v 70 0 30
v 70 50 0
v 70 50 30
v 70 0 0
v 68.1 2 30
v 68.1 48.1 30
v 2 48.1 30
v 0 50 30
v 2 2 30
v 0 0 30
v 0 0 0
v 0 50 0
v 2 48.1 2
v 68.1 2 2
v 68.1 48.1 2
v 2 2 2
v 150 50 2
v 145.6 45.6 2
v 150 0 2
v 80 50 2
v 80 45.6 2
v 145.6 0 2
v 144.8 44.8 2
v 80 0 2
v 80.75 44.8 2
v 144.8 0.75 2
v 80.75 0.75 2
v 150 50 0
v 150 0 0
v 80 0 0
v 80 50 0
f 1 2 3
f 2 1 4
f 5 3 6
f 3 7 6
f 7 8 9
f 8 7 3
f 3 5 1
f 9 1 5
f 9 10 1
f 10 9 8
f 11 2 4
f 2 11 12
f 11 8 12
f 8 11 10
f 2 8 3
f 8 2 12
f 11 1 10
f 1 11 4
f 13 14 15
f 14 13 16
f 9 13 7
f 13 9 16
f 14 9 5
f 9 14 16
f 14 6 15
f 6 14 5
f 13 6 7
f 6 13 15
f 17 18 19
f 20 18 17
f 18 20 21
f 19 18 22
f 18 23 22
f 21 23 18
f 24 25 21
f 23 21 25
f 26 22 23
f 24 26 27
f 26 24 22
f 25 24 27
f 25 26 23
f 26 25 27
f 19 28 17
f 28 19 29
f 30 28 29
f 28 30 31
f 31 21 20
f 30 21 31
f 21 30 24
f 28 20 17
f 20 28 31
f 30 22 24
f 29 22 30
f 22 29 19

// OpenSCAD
// Two-part enclosure for small electronics board
// Part 1: Box (left)
// Part 2: Lid (right, printed upside down)
// Prints together with a 10 mm gap.

$fn = 64;

// --- Dimensions ---

// Part 1: Box
// Outer dimensions (X x Y x Z)
BOX_OUT_X = 70;
BOX_OUT_Y = 50;
BOX_OUT_Z = 30;
// Wall thicknesses
BOX_WALL_THICK = 2;
BOX_FLOOR_THICK = 2;

// Part 2: Lid
// Base plate dimensions
LID_PLATE_X = 70;
LID_PLATE_Y = 50;
LID_PLATE_THICK = 2;
// Lip dimensions (outer size of the lip)
LIP_OUT_X = 65.6;
LIP_OUT_Y = 45.6;
LIP_THICK = 1.5;
LIP_HEIGHT = 4;

// Layout
// 10 mm gap between parts
GAP = 10;

// --- Part 1: The Box ---
// Rests on XY plane, centered on origin.
// Dimensions: 70 x 50 x 30
// Walls: 2mm, Floor: 2mm, Open top.

translate([0, 0, 0])
difference() {
    // Outer block
    cube([BOX_OUT_X, BOX_OUT_Y, BOX_OUT_Z], center = false);
    
    // Cut out the inside (hollow)
    // Inner X = 70 - 2*2 = 66
    // Inner Y = 50 - 2*2 = 46
    // Inner Z = 30 - 2 (floor) = 28
    translate([BOX_WALL_THICK, BOX_WALL_THICK, BOX_FLOOR_THICK])
    cube([
        BOX_OUT_X - (2 * BOX_WALL_THICK),
        BOX_OUT_Y - (2 * BOX_WALL_THICK),
        BOX_OUT_Z - BOX_FLOOR_THICK
    ], center = false);
    
    // Extend cut slightly to ensure clean separation from walls
    translate([BOX_WALL_THICK, BOX_WALL_THICK, BOX_FLOOR_THICK])
    cube([
        BOX_OUT_X - (2 * BOX_WALL_THICK) + 0.1,
        BOX_OUT_Y - (2 * BOX_WALL_THICK) + 0.1,
        BOX_OUT_Z - BOX_FLOOR_THICK + 0.1
    ], center = false);
}

// --- Part 2: The Lid ---
// Printed upside down.
// Base plate: 70 x 50 x 2 mm.
// Lip: 1.5 mm thick wall, 4 mm tall.
// Lip outer size: 65.6 x 45.6 mm.
// Position: On the +X side of the box (centered vertically on the bed).
// Since the box is centered at X=0, and the gap is 10mm, the box occupies X=-35 to X=35.
// The gap is X=35 to X=45.
// The lid should start at X=45.
// Lid width = 70. Center of lid = 45 + 35 = 80.
// So translate X by 80.

translate([80, 0, 0])
difference() {
    // 1. The Base Plate
    // Dimensions: 70 x 50 x 2
    cube([LID_PLATE_X, LID_PLATE_Y, LID_PLATE_THICK], center = false);
    
    // 2. The Lip (printed upside down, so it hangs "down" from the top face of the plate)
    // The lip is a rectangular wall.
    // Outer size: 65.6 x 45.6
    // Thickness: 1.5
    // Height: 4
    // It sits on top of the plate (Z=2 relative to plate start).
    
    // Calculate inner dimensions of the lip hole
    LIP_IN_X = LIP_OUT_X - LIP_THICK;
    LIP_IN_Y = LIP_OUT_Y - LIP_THICK;
    
    // Position of the lip relative to the plate center
    // Plate is centered at 0,0 relative to itself.
    // Lip is centered on the plate.
    translate([0, 0, LID_PLATE_THICK])
    // The lip is a hollow box shape (a frame)
    difference() {
        // Outer volume of the lip
        cube([LIP_OUT_X, LIP_OUT_Y, LIP_HEIGHT], center = false);
        
        // Inner void of the lip
        // Extend slightly past the face to ensure clean cut
        translate([LIP_THICK/2, LIP_THICK/2, 0])
        cube([
            LIP_IN_X - 0.05,
            LIP_IN_Y - 0.05,
            LIP_HEIGHT + 0.05
        ], center = false);
    }
}
